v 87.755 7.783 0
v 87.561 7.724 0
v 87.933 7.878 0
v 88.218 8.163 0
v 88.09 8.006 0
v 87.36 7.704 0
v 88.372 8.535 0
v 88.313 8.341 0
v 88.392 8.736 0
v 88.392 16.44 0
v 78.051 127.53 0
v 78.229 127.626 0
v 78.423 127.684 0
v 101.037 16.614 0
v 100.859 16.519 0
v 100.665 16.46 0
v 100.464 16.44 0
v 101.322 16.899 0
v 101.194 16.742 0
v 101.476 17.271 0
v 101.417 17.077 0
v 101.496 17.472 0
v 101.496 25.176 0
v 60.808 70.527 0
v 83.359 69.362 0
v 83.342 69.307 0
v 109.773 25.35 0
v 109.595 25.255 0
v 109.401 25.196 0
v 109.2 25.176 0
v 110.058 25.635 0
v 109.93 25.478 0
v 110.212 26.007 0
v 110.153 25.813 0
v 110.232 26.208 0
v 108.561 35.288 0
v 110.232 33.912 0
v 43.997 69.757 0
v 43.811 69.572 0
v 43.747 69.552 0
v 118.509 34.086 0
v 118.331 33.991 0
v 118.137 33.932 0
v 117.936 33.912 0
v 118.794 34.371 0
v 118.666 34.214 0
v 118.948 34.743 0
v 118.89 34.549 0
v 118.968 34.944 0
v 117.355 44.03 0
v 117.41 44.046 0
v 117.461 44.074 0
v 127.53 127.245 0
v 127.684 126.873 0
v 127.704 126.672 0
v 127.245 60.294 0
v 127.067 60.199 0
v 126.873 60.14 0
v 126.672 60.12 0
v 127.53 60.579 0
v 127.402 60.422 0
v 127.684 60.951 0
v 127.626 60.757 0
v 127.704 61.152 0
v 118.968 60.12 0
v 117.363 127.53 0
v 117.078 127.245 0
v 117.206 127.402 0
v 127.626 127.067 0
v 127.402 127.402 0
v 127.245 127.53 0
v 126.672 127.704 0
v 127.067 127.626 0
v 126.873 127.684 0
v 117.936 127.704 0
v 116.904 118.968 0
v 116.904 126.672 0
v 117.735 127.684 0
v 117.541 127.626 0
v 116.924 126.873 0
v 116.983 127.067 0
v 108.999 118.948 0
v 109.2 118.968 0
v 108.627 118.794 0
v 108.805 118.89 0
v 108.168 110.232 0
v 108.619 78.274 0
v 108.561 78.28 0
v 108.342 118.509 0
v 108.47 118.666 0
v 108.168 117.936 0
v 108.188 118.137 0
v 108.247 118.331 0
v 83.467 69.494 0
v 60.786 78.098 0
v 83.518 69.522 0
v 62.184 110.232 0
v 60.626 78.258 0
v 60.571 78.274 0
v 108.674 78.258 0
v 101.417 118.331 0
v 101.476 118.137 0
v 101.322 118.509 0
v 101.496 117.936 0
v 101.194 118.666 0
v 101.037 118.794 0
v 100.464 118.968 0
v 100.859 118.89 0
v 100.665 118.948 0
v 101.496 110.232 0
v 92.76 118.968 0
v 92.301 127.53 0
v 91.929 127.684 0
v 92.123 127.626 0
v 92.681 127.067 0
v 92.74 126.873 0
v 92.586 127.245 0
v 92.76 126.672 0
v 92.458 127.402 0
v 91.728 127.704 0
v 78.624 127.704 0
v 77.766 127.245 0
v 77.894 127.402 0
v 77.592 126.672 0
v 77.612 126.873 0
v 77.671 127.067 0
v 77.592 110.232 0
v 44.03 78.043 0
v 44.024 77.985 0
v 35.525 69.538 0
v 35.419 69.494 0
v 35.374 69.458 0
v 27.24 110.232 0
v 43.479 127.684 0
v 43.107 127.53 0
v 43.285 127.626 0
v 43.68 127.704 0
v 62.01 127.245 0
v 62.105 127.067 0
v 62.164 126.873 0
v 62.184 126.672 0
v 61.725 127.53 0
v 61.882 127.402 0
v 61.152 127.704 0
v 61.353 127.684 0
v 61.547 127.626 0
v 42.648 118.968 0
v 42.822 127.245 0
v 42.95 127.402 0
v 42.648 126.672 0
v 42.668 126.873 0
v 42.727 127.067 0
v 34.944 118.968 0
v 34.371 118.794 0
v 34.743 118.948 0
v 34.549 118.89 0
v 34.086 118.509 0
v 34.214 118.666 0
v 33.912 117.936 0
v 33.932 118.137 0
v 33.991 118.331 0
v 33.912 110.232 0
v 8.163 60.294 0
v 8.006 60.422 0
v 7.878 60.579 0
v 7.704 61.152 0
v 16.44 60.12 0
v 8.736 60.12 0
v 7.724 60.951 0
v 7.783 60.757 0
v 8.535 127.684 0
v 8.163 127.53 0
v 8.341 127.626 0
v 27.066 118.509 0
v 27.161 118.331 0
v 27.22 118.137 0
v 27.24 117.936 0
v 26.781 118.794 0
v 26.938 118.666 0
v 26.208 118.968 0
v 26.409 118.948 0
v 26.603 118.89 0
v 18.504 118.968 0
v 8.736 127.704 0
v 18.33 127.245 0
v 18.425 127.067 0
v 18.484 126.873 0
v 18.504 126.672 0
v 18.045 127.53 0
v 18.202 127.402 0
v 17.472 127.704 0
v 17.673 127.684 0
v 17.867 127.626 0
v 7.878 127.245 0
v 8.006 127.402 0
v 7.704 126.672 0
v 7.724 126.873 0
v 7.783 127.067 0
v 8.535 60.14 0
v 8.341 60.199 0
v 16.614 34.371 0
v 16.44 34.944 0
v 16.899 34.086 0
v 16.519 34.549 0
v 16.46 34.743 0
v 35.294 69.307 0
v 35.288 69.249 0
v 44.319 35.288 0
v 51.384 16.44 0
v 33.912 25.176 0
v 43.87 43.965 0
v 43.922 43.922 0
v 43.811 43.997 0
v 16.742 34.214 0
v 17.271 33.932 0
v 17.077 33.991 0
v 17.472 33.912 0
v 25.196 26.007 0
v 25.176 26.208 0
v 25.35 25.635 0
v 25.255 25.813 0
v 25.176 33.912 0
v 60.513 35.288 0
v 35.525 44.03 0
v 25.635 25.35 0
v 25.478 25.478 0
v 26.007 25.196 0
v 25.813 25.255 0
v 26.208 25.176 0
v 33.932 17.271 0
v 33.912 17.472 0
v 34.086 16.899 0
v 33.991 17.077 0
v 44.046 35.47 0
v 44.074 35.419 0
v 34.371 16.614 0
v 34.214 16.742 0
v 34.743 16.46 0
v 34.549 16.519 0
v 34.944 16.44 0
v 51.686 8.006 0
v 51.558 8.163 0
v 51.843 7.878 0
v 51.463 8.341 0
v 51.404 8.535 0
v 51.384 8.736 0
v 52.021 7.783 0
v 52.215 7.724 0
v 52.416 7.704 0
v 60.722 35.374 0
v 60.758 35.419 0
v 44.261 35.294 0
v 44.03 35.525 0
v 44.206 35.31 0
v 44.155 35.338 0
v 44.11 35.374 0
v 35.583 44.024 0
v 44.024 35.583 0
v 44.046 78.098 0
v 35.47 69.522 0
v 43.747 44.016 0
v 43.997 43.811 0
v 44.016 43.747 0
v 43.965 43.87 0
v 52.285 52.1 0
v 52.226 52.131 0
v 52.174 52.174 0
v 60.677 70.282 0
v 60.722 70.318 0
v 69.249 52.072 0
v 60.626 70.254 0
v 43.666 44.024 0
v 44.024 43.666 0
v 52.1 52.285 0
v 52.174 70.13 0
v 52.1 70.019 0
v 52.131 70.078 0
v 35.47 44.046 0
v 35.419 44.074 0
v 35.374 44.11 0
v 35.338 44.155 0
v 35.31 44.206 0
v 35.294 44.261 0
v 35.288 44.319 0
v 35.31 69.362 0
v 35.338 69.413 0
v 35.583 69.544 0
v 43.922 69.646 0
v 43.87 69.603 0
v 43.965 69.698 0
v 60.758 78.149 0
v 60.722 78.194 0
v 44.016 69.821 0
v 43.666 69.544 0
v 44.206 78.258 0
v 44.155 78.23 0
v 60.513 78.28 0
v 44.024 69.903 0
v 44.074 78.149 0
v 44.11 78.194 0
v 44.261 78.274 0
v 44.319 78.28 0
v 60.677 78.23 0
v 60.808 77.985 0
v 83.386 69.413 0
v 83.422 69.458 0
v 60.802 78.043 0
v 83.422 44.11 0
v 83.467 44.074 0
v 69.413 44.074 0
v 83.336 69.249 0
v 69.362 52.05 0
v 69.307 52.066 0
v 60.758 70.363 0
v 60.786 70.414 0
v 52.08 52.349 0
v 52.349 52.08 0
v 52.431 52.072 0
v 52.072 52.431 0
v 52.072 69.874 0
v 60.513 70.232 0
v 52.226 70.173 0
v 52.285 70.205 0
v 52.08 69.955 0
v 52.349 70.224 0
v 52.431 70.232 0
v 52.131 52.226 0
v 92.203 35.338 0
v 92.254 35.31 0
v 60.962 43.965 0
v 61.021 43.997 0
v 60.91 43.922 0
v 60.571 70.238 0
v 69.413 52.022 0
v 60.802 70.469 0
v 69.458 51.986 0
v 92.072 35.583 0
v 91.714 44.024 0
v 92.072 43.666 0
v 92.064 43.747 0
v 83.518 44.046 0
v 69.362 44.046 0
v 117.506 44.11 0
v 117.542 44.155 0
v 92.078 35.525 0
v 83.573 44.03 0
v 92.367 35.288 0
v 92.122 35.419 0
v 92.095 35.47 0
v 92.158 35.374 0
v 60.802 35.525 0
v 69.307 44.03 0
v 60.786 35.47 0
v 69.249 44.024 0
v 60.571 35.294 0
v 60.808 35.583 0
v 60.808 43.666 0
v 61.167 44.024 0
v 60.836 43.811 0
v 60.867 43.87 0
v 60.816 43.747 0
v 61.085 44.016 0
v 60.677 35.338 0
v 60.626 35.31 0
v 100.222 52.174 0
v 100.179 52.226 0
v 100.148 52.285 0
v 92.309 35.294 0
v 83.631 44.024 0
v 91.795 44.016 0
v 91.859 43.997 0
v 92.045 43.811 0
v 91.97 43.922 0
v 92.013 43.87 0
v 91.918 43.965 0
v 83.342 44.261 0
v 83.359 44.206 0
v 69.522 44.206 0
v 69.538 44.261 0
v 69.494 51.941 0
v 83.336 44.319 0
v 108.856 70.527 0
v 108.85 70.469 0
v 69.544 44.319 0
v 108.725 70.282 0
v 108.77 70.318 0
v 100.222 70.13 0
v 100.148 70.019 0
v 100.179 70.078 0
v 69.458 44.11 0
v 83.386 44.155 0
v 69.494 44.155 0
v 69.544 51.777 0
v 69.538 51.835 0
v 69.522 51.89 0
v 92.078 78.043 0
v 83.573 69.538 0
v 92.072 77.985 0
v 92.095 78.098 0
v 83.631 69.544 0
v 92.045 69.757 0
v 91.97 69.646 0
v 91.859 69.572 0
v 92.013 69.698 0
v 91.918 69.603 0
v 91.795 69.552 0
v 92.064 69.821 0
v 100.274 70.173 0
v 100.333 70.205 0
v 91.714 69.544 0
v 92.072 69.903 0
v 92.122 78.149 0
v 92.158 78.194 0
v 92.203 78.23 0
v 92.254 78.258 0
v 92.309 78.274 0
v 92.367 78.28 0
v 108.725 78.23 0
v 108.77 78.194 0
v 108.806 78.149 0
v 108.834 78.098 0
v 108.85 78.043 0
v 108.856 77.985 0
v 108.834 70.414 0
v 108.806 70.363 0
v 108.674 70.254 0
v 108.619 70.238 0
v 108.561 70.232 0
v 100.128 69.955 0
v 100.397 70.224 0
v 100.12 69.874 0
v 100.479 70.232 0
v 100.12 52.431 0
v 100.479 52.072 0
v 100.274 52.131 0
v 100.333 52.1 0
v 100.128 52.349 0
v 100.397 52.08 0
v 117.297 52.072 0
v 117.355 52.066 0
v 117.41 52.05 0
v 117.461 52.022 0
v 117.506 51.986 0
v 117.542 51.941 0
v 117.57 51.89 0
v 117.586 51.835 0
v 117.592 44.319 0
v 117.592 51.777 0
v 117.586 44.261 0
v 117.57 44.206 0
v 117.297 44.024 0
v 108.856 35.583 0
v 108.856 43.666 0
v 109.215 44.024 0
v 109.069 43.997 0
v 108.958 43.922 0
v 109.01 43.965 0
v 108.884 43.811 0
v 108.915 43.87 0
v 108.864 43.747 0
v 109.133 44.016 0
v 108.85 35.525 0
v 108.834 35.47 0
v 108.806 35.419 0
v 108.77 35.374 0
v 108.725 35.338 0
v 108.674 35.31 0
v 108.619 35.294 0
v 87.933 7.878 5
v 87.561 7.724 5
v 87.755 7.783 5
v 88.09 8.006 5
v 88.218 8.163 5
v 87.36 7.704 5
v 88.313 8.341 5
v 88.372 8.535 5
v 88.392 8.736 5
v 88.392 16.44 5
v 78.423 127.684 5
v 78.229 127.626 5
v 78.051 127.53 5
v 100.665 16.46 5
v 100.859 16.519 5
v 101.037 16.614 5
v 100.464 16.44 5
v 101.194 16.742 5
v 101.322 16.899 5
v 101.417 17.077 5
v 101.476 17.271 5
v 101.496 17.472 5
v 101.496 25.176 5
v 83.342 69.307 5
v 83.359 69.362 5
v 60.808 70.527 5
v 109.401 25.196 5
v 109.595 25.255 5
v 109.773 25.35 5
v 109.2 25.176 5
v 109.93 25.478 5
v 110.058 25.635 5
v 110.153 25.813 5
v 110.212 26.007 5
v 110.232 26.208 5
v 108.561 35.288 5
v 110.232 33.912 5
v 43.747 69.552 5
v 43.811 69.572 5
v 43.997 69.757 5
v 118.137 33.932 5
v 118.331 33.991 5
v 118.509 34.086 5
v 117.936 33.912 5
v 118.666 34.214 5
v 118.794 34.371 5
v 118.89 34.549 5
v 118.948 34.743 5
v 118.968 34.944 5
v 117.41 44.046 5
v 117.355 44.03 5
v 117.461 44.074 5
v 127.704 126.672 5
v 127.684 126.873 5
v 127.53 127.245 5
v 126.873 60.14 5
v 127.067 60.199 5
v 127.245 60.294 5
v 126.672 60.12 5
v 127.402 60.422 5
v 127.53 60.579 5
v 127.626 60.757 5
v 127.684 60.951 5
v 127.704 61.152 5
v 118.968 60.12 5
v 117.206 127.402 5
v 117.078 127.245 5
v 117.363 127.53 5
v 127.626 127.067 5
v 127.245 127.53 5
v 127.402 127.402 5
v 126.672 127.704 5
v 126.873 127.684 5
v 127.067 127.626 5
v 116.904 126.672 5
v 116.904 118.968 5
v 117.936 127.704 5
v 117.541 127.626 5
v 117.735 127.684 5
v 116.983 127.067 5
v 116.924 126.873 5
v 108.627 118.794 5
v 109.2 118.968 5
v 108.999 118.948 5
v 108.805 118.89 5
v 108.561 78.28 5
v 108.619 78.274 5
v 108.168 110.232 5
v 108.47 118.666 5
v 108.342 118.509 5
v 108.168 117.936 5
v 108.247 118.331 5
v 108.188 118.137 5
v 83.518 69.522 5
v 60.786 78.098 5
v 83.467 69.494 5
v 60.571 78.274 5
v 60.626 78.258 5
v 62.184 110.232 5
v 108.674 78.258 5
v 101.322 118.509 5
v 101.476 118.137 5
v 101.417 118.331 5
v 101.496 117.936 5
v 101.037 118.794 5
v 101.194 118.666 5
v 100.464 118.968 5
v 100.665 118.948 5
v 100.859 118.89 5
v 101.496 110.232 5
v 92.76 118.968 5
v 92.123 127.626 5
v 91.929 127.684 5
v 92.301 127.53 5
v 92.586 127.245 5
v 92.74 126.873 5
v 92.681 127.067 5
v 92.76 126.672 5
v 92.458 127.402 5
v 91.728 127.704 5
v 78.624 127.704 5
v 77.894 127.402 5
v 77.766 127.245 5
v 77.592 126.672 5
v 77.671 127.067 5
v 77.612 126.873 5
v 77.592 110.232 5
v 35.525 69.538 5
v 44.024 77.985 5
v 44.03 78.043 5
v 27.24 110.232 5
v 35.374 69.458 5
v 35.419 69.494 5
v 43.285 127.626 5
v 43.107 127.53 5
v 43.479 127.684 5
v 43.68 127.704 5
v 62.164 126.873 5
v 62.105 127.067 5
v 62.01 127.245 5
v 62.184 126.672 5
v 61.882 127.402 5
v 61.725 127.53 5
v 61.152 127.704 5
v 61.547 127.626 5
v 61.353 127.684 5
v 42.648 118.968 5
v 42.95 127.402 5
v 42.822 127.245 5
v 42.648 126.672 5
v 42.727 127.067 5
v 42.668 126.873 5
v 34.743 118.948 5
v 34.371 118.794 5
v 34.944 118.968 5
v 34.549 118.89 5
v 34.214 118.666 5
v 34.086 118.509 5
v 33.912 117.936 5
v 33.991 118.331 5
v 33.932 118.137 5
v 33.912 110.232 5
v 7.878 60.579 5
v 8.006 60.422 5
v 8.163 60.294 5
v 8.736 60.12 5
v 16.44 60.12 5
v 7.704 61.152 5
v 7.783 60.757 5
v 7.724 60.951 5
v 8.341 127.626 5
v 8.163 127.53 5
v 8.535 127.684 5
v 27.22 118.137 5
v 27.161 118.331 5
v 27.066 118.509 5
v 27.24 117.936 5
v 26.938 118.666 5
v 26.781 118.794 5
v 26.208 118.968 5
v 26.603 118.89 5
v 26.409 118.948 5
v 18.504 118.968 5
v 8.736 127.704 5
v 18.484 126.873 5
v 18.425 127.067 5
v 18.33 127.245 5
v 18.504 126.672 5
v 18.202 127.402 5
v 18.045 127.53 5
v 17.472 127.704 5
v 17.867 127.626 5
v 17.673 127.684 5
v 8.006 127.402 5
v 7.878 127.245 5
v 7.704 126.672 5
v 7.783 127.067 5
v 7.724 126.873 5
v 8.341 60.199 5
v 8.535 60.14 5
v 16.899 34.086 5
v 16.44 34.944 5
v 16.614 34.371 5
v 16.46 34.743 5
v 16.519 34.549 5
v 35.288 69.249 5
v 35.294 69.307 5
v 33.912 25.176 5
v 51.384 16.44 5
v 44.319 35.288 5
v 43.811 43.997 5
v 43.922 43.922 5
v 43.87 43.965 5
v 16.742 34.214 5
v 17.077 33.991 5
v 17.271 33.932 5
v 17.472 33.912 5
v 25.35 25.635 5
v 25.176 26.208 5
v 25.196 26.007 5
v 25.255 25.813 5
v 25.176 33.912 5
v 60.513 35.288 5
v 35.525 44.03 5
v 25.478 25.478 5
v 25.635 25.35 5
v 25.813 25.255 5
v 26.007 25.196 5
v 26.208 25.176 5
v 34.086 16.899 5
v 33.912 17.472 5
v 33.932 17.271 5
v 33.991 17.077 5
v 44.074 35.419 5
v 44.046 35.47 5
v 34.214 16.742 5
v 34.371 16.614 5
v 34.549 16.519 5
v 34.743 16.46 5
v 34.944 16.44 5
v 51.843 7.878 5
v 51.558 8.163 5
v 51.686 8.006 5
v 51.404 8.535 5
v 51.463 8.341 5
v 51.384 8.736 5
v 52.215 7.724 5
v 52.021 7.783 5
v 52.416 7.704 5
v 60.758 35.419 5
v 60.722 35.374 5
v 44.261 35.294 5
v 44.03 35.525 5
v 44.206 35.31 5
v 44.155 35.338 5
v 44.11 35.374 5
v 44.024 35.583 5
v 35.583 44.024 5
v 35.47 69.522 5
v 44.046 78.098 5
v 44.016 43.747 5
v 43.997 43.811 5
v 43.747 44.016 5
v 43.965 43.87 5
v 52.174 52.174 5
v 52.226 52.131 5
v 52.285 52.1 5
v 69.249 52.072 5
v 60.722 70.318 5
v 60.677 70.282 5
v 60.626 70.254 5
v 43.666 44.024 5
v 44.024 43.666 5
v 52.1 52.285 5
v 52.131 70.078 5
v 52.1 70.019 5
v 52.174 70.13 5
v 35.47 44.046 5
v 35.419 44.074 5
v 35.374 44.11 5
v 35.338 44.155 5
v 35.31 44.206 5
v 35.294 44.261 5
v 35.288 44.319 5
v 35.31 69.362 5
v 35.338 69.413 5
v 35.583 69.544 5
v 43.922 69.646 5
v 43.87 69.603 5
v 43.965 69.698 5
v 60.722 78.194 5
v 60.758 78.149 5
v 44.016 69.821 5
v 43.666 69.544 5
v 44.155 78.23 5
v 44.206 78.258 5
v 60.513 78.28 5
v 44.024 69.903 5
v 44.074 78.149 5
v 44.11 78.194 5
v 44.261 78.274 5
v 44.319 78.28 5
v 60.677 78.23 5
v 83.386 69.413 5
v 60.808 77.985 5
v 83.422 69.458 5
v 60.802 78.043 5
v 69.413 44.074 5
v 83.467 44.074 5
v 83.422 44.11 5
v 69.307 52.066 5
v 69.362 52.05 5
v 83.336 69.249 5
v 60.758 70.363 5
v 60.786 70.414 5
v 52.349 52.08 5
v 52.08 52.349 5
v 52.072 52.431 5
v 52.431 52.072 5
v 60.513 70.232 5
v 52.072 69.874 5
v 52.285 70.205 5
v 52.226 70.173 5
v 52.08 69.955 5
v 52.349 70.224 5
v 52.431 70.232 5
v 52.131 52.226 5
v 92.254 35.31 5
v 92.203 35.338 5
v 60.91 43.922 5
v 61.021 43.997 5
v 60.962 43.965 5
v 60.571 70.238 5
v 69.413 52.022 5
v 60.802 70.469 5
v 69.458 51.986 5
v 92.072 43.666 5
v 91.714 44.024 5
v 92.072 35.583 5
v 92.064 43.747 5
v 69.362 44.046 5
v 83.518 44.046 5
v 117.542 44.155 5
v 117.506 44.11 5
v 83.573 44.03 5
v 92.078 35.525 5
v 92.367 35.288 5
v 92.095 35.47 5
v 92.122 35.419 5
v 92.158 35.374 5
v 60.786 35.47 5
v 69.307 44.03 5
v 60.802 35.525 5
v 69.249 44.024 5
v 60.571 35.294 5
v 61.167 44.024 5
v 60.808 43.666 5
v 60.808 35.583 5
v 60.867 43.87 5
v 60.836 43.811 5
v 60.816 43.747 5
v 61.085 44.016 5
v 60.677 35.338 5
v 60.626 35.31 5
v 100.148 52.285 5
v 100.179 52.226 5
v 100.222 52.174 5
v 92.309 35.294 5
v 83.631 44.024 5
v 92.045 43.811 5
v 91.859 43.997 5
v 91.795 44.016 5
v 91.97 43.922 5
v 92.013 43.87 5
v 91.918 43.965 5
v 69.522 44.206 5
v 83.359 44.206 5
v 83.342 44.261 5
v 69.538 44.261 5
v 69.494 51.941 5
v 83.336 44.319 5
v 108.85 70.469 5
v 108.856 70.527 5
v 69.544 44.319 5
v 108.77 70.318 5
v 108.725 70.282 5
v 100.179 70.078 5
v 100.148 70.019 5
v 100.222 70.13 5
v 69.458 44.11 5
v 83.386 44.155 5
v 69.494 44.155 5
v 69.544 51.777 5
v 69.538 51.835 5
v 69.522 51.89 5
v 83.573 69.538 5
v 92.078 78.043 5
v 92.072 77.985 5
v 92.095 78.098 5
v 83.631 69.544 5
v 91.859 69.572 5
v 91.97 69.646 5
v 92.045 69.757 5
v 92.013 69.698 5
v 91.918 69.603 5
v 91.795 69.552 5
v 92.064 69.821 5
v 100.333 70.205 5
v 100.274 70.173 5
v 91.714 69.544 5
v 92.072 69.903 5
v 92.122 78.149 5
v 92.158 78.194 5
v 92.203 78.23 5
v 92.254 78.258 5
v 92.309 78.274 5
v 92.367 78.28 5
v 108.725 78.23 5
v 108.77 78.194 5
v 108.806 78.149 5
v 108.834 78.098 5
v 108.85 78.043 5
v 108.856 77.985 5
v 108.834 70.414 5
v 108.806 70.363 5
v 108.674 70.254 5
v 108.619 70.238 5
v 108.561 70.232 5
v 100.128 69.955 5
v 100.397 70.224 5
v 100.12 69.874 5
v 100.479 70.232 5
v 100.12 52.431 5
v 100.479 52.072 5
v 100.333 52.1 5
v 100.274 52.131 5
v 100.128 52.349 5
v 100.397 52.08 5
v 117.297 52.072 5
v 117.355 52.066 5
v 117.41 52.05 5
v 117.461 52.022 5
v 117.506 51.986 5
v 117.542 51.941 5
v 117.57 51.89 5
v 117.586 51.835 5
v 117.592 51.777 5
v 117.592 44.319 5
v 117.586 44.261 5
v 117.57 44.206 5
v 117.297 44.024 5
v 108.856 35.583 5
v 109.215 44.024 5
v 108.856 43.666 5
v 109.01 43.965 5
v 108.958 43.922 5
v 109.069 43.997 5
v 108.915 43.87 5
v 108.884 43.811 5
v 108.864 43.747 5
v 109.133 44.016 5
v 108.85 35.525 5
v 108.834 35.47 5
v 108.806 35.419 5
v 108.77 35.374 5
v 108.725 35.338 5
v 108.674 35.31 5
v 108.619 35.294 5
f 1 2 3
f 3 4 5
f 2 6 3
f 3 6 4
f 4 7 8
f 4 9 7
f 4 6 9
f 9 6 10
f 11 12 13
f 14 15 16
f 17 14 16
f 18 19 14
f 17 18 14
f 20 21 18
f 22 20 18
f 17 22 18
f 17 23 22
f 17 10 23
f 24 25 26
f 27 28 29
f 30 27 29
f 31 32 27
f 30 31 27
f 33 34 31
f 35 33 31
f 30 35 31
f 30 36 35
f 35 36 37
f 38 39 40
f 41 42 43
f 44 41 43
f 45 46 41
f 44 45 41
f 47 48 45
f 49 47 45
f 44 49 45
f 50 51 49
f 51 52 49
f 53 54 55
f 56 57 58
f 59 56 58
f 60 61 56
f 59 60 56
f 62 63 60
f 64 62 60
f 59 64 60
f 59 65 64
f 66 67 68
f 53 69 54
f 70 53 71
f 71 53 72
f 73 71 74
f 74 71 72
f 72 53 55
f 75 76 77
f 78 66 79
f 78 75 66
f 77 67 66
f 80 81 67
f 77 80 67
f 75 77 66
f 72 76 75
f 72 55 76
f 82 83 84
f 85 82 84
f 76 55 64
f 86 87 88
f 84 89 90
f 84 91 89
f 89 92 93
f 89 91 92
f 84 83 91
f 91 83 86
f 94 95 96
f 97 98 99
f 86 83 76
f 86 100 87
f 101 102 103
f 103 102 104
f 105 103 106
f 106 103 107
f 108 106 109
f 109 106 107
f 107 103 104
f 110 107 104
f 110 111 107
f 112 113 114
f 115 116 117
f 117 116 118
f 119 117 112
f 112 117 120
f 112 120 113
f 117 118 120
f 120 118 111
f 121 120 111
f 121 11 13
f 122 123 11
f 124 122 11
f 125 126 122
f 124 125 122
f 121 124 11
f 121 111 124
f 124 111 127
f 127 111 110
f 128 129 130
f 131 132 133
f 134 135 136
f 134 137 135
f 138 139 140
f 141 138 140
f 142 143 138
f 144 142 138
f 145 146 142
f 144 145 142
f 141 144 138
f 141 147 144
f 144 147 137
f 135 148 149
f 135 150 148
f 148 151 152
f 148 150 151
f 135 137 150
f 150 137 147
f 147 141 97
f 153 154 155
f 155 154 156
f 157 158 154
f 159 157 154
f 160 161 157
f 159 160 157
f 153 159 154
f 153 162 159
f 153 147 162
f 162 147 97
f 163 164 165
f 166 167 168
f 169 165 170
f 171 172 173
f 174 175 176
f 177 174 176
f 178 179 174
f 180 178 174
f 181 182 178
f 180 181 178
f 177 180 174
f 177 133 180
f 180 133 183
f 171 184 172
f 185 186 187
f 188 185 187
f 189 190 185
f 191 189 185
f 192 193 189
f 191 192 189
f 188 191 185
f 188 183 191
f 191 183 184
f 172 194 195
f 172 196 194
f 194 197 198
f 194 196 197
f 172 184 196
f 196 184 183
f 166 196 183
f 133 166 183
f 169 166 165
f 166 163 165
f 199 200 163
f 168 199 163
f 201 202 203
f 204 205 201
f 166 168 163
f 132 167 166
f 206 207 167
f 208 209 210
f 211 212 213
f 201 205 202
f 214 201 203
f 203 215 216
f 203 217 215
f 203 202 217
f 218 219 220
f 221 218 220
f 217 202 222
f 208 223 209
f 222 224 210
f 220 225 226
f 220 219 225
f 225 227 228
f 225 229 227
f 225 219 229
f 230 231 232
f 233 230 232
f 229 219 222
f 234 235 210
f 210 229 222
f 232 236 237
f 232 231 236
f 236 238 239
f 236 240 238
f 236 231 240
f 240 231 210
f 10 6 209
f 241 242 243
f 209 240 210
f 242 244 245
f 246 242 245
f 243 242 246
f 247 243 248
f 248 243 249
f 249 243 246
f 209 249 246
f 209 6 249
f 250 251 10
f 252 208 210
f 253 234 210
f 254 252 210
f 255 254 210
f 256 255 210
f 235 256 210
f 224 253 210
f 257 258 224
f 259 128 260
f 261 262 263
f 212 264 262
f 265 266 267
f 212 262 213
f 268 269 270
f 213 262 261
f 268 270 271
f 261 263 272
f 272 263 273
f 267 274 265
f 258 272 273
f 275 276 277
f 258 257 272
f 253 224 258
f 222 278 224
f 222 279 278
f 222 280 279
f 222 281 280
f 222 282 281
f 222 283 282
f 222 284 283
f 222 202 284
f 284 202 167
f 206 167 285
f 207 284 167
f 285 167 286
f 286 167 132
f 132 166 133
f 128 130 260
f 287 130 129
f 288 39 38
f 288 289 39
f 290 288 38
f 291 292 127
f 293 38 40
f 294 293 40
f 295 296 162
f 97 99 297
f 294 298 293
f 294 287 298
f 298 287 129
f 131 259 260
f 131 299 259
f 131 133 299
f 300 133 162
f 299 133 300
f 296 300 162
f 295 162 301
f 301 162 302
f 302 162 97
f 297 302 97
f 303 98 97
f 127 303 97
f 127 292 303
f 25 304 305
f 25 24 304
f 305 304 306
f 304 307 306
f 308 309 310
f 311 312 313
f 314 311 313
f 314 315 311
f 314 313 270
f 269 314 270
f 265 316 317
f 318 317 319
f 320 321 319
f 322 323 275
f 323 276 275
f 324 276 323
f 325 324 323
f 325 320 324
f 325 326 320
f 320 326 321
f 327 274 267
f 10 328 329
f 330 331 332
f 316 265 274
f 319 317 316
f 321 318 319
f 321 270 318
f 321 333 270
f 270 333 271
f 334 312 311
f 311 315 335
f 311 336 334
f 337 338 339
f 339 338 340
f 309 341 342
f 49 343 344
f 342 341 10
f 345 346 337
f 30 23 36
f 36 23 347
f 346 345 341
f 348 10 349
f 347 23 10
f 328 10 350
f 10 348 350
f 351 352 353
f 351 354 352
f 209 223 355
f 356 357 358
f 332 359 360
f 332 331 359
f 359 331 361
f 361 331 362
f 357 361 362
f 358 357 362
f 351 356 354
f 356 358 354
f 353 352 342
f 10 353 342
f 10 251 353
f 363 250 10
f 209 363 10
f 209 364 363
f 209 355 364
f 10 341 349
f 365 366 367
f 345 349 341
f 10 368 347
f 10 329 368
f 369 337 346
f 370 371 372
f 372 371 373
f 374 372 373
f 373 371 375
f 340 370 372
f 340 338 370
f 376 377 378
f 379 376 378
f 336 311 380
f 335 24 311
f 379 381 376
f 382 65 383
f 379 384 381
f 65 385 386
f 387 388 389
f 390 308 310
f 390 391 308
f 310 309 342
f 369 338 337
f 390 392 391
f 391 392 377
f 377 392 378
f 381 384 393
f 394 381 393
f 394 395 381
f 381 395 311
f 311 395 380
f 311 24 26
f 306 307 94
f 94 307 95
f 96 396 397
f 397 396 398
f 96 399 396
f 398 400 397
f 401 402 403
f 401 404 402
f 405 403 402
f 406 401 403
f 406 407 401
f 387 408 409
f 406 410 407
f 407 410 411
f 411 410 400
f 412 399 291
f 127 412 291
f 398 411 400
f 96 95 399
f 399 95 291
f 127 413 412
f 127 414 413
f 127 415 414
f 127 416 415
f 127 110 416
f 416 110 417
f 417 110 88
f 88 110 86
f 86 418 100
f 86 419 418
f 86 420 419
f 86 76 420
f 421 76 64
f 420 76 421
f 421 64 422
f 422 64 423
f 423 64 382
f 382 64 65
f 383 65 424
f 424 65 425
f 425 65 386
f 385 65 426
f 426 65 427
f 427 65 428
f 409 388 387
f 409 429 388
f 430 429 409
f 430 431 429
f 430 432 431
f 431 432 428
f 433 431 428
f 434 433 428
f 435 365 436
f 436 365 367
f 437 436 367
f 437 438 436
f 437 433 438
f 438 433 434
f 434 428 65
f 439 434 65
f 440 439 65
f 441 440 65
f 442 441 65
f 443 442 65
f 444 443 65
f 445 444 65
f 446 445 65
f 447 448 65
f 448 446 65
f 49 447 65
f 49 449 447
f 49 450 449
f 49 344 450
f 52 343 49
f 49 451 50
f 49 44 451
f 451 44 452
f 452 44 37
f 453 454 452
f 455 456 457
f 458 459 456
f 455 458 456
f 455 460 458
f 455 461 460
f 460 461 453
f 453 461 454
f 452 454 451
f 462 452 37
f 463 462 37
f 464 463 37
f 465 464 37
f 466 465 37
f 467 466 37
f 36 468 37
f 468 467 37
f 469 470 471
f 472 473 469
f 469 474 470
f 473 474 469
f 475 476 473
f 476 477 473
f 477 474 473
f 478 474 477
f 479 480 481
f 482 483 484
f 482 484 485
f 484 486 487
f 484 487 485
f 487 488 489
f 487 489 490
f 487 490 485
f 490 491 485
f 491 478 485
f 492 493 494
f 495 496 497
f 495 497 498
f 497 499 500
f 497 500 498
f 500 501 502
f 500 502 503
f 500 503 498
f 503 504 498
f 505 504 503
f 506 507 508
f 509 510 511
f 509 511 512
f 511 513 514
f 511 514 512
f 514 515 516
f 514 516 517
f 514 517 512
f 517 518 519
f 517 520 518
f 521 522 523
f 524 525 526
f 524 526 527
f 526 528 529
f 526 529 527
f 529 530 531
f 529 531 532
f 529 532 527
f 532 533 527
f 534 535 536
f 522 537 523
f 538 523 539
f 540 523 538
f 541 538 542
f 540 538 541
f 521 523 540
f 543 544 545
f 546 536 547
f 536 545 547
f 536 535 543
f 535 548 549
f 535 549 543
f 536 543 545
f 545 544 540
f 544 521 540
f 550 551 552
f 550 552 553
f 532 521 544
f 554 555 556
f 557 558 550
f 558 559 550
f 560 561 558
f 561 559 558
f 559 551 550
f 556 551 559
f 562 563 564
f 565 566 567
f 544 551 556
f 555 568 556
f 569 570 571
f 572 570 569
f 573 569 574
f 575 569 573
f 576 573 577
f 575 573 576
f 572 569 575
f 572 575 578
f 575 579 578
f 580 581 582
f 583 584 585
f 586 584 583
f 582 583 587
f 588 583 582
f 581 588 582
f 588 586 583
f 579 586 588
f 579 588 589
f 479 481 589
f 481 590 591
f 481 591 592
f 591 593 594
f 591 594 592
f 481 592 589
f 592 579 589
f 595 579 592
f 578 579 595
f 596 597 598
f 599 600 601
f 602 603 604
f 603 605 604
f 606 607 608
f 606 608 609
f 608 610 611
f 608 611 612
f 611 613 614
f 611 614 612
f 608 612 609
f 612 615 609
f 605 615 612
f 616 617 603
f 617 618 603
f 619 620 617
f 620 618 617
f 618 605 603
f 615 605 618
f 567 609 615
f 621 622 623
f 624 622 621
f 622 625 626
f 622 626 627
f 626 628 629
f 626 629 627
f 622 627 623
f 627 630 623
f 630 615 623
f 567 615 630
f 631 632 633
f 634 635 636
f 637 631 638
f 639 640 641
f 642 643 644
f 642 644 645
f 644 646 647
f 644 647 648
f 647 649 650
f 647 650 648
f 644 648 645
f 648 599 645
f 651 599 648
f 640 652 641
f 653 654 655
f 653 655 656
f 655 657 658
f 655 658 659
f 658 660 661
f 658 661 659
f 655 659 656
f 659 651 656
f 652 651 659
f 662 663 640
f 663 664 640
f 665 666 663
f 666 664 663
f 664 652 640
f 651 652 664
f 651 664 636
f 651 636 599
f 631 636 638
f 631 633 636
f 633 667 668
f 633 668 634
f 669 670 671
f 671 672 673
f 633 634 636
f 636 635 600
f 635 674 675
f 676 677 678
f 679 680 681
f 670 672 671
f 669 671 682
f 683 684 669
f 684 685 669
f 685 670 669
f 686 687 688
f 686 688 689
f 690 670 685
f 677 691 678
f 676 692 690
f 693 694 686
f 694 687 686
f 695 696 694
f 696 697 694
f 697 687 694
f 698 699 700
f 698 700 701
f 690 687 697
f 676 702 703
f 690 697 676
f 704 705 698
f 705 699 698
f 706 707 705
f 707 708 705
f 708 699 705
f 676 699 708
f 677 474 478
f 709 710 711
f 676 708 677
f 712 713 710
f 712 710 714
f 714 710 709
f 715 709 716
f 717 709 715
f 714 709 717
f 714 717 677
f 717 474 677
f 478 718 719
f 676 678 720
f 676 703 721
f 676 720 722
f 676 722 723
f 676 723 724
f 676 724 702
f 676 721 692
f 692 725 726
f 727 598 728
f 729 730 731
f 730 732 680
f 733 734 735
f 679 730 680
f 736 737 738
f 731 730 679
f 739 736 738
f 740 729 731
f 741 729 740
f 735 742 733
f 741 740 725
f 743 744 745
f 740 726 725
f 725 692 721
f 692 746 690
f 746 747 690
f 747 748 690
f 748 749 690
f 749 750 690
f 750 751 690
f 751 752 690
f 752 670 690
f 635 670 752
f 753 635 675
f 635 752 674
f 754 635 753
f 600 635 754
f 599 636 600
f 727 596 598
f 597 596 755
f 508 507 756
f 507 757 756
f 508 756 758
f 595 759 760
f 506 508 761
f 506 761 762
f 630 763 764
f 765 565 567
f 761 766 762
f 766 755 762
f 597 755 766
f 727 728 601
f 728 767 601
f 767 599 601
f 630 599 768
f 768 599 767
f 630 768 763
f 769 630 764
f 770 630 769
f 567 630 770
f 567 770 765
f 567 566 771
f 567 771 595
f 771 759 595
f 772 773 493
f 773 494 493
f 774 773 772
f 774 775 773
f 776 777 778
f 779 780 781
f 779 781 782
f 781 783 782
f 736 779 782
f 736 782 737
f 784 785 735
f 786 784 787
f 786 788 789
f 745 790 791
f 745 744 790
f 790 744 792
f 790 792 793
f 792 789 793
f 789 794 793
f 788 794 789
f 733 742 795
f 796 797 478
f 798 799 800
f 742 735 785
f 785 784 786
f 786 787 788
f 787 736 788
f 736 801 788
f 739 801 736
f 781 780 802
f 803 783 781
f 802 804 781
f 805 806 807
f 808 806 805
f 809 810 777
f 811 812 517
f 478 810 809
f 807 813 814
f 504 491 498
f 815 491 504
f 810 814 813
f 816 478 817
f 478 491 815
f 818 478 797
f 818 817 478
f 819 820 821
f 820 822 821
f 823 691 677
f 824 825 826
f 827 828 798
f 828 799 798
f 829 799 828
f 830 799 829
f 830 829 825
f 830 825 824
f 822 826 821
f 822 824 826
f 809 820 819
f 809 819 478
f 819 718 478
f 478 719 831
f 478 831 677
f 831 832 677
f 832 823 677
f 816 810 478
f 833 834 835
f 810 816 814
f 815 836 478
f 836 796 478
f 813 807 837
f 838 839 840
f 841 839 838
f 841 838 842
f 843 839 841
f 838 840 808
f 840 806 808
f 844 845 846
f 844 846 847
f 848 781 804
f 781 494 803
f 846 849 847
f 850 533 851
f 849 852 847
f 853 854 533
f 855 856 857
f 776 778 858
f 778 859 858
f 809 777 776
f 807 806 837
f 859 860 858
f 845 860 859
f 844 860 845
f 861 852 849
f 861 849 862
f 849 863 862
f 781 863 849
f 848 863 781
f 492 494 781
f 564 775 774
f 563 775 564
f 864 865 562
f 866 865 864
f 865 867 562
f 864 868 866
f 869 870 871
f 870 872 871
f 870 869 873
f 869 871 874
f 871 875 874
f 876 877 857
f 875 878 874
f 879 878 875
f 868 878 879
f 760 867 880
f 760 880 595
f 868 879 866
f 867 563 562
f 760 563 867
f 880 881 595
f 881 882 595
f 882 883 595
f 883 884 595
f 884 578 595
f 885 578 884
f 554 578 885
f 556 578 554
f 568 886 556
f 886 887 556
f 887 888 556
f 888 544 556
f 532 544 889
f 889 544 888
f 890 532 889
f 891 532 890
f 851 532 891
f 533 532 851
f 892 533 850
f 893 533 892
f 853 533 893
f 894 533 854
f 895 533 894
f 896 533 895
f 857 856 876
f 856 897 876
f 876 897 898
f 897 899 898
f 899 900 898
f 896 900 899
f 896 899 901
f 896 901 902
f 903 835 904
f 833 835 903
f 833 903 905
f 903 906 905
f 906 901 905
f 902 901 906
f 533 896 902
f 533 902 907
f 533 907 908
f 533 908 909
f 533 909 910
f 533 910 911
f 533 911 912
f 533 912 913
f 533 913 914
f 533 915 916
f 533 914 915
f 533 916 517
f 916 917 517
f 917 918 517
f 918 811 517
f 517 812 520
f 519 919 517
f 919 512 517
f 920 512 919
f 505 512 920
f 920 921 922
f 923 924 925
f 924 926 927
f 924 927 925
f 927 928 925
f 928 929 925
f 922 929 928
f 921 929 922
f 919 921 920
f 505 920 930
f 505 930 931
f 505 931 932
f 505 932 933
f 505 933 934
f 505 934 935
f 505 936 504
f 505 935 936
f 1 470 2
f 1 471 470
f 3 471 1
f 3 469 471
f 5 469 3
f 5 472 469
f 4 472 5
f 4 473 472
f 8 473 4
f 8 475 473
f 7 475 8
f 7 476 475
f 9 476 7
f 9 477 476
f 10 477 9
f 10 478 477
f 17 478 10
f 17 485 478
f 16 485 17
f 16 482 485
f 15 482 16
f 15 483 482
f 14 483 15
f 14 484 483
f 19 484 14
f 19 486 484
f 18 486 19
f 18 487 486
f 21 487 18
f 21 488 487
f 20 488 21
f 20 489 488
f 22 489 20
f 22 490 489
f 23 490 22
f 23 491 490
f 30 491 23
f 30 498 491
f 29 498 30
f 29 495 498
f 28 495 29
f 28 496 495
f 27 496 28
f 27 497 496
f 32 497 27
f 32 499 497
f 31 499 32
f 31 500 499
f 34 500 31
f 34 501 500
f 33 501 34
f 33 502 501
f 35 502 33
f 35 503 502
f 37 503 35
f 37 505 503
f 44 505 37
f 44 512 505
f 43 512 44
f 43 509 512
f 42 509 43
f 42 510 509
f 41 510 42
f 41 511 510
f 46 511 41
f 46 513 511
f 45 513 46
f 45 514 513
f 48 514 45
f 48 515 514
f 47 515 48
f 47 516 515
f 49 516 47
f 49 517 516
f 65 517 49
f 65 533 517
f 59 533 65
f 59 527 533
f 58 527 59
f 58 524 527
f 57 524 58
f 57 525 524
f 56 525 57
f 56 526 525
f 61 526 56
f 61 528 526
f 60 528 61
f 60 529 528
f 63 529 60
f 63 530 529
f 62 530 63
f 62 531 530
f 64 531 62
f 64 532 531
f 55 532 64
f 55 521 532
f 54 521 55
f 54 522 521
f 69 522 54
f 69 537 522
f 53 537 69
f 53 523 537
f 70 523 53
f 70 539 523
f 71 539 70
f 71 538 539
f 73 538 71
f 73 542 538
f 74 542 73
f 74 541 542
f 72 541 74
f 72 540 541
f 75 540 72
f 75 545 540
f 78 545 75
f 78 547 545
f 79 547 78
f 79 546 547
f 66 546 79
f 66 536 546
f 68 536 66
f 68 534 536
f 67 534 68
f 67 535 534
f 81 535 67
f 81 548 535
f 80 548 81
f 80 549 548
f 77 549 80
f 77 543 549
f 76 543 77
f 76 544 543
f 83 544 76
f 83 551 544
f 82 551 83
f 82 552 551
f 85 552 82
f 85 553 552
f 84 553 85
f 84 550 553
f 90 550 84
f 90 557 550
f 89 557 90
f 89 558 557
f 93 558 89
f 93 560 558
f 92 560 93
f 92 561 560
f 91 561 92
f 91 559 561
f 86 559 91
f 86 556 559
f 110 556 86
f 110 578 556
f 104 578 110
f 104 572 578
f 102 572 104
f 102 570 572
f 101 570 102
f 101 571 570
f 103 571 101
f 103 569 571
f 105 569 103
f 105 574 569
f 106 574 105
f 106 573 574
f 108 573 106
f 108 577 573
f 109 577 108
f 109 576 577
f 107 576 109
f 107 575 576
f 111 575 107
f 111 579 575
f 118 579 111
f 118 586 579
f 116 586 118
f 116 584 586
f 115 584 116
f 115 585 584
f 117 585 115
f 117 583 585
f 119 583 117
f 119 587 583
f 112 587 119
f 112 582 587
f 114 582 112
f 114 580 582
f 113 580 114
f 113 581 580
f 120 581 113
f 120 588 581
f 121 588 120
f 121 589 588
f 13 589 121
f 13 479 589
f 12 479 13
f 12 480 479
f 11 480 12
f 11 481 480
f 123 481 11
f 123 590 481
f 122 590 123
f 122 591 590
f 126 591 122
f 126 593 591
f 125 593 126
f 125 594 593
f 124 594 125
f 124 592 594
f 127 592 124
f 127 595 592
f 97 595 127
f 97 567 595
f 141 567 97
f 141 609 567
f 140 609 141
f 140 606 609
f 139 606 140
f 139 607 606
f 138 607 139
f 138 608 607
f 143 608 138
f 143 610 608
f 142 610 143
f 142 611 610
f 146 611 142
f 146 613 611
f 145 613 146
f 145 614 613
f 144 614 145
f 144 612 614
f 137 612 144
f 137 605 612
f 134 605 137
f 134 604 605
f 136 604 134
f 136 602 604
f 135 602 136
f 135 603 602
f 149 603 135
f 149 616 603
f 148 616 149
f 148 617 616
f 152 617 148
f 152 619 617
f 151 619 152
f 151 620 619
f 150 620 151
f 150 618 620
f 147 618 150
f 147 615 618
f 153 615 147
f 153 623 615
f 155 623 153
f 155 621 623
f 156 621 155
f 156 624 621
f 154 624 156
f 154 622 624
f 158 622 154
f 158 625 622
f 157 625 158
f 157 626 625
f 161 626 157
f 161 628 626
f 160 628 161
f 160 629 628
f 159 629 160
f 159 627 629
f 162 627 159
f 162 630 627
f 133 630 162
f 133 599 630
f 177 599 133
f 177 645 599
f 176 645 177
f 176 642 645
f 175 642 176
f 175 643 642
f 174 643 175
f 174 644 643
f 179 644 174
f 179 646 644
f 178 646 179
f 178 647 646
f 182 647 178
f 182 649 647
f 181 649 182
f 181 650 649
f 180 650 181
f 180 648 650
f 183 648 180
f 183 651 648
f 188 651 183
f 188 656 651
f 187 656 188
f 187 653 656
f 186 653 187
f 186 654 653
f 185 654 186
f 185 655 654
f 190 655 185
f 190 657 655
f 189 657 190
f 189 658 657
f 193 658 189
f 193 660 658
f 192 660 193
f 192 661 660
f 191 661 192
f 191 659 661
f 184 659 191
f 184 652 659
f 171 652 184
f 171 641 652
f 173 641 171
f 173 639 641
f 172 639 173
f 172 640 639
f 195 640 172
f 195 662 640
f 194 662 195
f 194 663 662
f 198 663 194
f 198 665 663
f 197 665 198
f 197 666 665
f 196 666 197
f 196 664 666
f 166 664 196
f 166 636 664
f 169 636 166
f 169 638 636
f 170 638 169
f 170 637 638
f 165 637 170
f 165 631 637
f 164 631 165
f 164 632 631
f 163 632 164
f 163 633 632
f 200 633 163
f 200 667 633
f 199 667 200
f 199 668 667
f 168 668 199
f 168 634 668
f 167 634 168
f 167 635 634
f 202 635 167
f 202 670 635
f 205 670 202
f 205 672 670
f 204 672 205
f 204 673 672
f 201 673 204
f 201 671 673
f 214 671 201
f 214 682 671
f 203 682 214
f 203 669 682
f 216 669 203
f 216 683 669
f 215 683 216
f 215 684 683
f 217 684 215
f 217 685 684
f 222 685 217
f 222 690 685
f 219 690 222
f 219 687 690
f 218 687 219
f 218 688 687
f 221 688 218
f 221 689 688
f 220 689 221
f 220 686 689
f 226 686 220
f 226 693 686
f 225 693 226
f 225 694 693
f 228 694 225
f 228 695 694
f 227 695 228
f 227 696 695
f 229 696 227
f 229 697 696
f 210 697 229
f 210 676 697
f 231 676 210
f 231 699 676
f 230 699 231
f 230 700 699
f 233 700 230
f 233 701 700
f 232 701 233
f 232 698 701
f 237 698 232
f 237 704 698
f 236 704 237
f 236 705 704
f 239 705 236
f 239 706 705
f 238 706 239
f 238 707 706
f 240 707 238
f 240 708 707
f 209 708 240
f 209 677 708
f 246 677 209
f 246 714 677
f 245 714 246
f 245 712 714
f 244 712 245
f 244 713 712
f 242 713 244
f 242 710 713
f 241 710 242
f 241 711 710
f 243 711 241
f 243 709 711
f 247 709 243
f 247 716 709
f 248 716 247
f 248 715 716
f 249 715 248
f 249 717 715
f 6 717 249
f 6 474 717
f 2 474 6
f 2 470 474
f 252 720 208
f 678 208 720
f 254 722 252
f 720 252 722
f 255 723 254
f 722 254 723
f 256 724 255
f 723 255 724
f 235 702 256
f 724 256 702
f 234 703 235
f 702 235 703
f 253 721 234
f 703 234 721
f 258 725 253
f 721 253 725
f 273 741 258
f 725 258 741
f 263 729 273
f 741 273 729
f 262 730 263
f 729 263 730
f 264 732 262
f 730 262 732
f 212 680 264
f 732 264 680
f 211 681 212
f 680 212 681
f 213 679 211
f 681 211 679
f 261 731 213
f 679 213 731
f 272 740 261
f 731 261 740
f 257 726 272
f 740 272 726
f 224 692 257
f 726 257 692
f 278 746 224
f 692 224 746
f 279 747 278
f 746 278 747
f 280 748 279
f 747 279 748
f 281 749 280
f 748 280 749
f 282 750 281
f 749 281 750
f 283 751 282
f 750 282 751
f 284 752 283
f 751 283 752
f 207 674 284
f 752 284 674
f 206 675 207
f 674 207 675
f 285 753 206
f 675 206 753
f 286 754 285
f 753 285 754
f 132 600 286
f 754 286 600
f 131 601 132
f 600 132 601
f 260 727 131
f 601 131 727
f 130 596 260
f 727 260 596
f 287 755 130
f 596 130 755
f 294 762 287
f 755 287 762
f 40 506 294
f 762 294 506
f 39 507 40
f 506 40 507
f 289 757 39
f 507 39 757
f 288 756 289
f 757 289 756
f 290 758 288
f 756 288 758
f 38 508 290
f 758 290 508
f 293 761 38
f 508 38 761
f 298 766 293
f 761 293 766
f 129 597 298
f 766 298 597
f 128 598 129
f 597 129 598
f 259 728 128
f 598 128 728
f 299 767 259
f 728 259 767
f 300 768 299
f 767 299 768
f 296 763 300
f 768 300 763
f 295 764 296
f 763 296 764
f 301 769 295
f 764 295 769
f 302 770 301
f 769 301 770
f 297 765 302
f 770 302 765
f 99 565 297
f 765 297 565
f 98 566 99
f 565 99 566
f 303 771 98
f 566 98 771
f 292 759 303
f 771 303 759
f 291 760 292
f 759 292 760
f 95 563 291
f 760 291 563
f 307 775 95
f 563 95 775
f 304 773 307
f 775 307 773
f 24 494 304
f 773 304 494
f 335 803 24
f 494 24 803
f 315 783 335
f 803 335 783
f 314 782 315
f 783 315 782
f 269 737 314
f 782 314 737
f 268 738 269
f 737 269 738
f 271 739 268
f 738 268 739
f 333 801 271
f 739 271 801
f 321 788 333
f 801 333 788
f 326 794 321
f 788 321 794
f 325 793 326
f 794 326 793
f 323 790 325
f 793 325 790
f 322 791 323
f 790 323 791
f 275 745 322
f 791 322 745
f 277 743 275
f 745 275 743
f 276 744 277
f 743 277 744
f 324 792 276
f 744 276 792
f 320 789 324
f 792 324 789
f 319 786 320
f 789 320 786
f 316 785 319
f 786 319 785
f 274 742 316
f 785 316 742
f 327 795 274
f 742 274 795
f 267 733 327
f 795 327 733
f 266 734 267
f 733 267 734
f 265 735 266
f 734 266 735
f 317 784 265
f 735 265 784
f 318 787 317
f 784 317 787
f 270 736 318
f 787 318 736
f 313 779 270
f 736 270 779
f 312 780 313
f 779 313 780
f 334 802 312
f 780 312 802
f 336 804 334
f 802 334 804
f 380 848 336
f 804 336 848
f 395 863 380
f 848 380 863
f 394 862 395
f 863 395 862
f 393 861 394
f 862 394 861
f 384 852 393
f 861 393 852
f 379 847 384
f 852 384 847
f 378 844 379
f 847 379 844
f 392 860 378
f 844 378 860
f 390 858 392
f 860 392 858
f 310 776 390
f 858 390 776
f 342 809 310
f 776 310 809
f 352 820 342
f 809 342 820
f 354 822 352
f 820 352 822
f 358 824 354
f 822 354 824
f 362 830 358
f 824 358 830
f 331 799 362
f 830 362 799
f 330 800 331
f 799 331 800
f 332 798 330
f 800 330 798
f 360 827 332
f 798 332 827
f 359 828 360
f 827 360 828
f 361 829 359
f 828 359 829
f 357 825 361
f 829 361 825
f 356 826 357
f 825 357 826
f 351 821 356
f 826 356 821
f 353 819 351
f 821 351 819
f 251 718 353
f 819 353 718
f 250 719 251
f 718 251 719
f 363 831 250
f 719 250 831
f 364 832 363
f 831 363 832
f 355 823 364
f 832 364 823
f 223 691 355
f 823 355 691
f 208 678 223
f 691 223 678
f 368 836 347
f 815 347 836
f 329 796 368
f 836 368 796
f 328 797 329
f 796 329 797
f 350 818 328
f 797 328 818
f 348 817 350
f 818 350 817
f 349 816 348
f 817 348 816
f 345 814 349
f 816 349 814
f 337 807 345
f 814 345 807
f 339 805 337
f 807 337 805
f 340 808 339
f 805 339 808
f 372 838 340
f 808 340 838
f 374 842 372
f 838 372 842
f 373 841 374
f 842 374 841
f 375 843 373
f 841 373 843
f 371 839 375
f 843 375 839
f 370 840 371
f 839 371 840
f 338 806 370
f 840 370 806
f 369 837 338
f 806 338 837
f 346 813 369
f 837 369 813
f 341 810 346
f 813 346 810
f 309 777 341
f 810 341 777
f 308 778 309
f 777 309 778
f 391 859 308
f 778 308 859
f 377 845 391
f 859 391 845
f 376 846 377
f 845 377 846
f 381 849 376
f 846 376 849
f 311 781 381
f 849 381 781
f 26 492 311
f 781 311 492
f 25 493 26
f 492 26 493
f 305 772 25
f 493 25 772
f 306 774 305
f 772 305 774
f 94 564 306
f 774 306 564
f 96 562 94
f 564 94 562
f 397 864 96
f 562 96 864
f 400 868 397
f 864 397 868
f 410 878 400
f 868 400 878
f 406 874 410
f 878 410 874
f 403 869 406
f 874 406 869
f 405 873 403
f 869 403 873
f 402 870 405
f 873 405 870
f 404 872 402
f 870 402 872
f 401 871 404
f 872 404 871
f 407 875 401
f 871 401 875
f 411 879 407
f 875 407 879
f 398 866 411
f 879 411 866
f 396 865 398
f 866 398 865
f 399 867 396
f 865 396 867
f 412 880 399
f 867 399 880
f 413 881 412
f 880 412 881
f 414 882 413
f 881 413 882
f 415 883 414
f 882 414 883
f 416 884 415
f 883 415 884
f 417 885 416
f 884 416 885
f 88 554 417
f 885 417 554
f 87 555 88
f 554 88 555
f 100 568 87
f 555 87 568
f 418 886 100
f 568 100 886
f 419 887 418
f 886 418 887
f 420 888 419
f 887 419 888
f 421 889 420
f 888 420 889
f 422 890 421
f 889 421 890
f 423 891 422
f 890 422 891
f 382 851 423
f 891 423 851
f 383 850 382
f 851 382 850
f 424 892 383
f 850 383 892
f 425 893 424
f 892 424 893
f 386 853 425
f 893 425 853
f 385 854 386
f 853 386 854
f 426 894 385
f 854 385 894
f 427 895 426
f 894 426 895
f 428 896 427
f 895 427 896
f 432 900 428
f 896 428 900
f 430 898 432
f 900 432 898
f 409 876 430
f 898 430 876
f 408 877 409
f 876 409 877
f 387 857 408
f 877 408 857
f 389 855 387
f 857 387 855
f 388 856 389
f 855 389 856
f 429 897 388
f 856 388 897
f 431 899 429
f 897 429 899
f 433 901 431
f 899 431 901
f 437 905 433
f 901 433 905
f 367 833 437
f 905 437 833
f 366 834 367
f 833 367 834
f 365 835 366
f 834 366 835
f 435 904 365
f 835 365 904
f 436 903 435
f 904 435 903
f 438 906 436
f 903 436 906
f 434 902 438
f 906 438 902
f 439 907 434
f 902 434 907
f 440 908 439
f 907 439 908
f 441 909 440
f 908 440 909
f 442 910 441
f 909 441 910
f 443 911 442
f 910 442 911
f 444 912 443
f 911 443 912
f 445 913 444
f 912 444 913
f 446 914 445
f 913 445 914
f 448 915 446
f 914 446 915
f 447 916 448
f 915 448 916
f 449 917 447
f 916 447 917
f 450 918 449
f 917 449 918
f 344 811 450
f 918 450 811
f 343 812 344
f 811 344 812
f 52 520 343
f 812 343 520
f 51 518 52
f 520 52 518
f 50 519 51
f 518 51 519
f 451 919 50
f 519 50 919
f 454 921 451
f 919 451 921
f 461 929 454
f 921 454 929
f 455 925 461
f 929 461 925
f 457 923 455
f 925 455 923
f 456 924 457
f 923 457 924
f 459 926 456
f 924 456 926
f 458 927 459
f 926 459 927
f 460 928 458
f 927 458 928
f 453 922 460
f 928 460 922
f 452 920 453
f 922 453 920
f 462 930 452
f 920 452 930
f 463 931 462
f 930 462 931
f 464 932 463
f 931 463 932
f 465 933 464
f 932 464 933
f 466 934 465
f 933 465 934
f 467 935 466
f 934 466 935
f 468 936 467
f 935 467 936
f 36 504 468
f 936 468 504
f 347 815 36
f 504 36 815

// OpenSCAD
/*
 * Customizable Origami - Pacman Ghost - https://www.thingiverse.com/thing:2659699
 * by Dennis Hofmann - https://www.thingiverse.com/mightynozzle/about
 * created 2017-11-21
 * version v1.0
 *
 * Changelog
 * --------------
 * v1.0:
 *      - final design
 * --------------
 * 
 * This work is licensed under the Creative Commons - Attribution - NonCommercial - ShareAlike license.
 * https://creativecommons.org/licenses/by-nc-sa/3.0/
 */


 // Parameter Section //
//-------------------//

// preview[view:north, tilt:top]

// The maximum size of the longest side. The shorter side will be automatically resized in same ratio.
max_size_in_millimeter = 120; //[20:300]

// The height of the model.
model_height_in_millimeter = 5; //[0.2:0.2:100]

// Thickness of the outer outline.
outline_size_in_millimeter = 1.4; //[0.5:0.1:20]

// Thickness of the inner outline.
inline_size_in_millimeter = 0.7; //[0.5:0.1:20]

// Roundiness of the ends of the inner outlines.
inline_edge_radius_in_millimeter = 0.3; //[0.0:0.1:5]

// Flip model
flip_model = "no"; //[yes,no]

/*[hidden]*/
max_size = max_size_in_millimeter;
model_height = model_height_in_millimeter;
$fn=32;

// Outer Points
A1 = [64, 928];
A2 = [64, 448];
A3 = [128, 448];
A4 = [128, 256];
A5 = [192, 256];
A6 = [192, 192];
A7 = [256, 192];
A8 = [256, 128];
A9 = [384, 128];
A10 = [384, 64];
A11 = [640, 64];
A12 = [640, 128];
A13 = [736, 128];
A14 = [736, 192];
A15 = [800, 192];
A16 = [800, 256];
A17 = [864, 256];
A18 = [864, 320];
A19 = [864, 384];
A20 = [864, 448];
A21 = [928, 448];
A22 = [928, 928];
A23 = [864, 928];
A24 = [864, 864];
A25 = [800, 864];
A26 = [800, 800];
A27 = [736, 800];
A28 = [736, 864];
A29 = [672, 864];
A30 = [672, 928];
A31 = [576, 928];
A32 = [576, 800];
A33 = [448, 800];
A34 = [448, 928];
A35 = [320, 928];
A36 = [320, 864];
A37 = [256, 864];
A38 = [256, 800];
A39 = [192, 800];
A40 = [192, 864];
A41 = [128, 864];
A42 = [128, 928];

outline = [A1, A2, A3, A4, A5, A6, A7, A8, A9, A10, A11, A12, A13, A14, A15, A16, A17, A18, A19, A20, A21, A22, A23, A24, A25, A26, A27, A28, A29, A30, A31, A32, A33, A34, A35, A36, A37, A38, A39, A40, A41, A42];

// Inner Points
B1 = [256, 320];
B2 = [320, 320];
B3 = [320, 256];
B4 = [448, 256];
B5 = [448, 320];
B6 = [512, 320];
B7 = [512, 384];
B8 = [512, 512];
B9 = [448, 512];
B10 = [448, 576];
B11 = [320, 576];
B12 = [320, 512];
B13 = [256, 512];
B14 = [384, 384];
B15 = [384, 512];
B16 = [672, 256];
B17 = [672, 320];
B18 = [608, 320];
B19 = [608, 512];
B20 = [672, 512];
B21 = [672, 576];
B22 = [800, 576];
B23 = [800, 512];
B24 = [800, 320];
B25 = [736, 384];
B26 = [736, 512];
B27 = [864, 512];

// Polygons
C1 = [B15, B14, B7, B6, B5, B4, B3, B2, B1, B13, B12, B11, B10, B9];
C2 = [B24, A16, B16, B17, B18, B19, B20, B21, B22, B23, B26, B25, A19, A18];

cut_polygons = [C1, C2];

min_x = A2[0];
min_y = A11[1];
max_x = A21[0];
max_y = A1[1];

x_size = max_x - min_x;
y_size = max_y - min_y;

x_factor = max_size / x_size;
y_factor = max_size / y_size;

inline_size = x_size > y_size ? inline_size_in_millimeter / x_factor / 2: inline_size_in_millimeter / y_factor / 2;
inline_edge_radius = x_size > y_size ? inline_edge_radius_in_millimeter / x_factor: inline_edge_radius_in_millimeter / y_factor;
outline_size = x_size > y_size ? outline_size_in_millimeter / x_factor - inline_size: outline_size_in_millimeter / y_factor - inline_size;


 // Program Section //
//-----------------//

if(x_size > y_size) {
    resize(newsize=[max_size, x_factor * y_size, model_height]){
        if(flip_model == "yes") {
            mirror([0,1,0]) {
                rotate([180,180,0]) {    
                    create(outline, cut_polygons);
                }
            }
        } else {
            create(outline, cut_polygons);
        }
    }
} else {
    resize(newsize=[y_factor * x_size, max_size, model_height]){
        if(flip_model == "yes") {
            mirror([0,1,0]) {
                rotate([180,180,0]) {    
                    create(outline, cut_polygons);
                }
            }
        } else {
            create(outline, cut_polygons);
        }
    }
}


 // Module Section //
//----------------//

module create() {
    linear_extrude(height=1) {
        difference() {
            offset(r = -0) {
                offset(r = +outline_size) {
                    polygon(points = outline, convexity = 10);
                }
            }
            
            for(cut_polygon = [0:len(cut_polygons)]) {
                offset(r = +inline_edge_radius) {
                    offset(r = -inline_size - inline_edge_radius) {
                        polygon(points = cut_polygons[cut_polygon], convexity = 10);
                    }
                }
            }
        }
    }
}
